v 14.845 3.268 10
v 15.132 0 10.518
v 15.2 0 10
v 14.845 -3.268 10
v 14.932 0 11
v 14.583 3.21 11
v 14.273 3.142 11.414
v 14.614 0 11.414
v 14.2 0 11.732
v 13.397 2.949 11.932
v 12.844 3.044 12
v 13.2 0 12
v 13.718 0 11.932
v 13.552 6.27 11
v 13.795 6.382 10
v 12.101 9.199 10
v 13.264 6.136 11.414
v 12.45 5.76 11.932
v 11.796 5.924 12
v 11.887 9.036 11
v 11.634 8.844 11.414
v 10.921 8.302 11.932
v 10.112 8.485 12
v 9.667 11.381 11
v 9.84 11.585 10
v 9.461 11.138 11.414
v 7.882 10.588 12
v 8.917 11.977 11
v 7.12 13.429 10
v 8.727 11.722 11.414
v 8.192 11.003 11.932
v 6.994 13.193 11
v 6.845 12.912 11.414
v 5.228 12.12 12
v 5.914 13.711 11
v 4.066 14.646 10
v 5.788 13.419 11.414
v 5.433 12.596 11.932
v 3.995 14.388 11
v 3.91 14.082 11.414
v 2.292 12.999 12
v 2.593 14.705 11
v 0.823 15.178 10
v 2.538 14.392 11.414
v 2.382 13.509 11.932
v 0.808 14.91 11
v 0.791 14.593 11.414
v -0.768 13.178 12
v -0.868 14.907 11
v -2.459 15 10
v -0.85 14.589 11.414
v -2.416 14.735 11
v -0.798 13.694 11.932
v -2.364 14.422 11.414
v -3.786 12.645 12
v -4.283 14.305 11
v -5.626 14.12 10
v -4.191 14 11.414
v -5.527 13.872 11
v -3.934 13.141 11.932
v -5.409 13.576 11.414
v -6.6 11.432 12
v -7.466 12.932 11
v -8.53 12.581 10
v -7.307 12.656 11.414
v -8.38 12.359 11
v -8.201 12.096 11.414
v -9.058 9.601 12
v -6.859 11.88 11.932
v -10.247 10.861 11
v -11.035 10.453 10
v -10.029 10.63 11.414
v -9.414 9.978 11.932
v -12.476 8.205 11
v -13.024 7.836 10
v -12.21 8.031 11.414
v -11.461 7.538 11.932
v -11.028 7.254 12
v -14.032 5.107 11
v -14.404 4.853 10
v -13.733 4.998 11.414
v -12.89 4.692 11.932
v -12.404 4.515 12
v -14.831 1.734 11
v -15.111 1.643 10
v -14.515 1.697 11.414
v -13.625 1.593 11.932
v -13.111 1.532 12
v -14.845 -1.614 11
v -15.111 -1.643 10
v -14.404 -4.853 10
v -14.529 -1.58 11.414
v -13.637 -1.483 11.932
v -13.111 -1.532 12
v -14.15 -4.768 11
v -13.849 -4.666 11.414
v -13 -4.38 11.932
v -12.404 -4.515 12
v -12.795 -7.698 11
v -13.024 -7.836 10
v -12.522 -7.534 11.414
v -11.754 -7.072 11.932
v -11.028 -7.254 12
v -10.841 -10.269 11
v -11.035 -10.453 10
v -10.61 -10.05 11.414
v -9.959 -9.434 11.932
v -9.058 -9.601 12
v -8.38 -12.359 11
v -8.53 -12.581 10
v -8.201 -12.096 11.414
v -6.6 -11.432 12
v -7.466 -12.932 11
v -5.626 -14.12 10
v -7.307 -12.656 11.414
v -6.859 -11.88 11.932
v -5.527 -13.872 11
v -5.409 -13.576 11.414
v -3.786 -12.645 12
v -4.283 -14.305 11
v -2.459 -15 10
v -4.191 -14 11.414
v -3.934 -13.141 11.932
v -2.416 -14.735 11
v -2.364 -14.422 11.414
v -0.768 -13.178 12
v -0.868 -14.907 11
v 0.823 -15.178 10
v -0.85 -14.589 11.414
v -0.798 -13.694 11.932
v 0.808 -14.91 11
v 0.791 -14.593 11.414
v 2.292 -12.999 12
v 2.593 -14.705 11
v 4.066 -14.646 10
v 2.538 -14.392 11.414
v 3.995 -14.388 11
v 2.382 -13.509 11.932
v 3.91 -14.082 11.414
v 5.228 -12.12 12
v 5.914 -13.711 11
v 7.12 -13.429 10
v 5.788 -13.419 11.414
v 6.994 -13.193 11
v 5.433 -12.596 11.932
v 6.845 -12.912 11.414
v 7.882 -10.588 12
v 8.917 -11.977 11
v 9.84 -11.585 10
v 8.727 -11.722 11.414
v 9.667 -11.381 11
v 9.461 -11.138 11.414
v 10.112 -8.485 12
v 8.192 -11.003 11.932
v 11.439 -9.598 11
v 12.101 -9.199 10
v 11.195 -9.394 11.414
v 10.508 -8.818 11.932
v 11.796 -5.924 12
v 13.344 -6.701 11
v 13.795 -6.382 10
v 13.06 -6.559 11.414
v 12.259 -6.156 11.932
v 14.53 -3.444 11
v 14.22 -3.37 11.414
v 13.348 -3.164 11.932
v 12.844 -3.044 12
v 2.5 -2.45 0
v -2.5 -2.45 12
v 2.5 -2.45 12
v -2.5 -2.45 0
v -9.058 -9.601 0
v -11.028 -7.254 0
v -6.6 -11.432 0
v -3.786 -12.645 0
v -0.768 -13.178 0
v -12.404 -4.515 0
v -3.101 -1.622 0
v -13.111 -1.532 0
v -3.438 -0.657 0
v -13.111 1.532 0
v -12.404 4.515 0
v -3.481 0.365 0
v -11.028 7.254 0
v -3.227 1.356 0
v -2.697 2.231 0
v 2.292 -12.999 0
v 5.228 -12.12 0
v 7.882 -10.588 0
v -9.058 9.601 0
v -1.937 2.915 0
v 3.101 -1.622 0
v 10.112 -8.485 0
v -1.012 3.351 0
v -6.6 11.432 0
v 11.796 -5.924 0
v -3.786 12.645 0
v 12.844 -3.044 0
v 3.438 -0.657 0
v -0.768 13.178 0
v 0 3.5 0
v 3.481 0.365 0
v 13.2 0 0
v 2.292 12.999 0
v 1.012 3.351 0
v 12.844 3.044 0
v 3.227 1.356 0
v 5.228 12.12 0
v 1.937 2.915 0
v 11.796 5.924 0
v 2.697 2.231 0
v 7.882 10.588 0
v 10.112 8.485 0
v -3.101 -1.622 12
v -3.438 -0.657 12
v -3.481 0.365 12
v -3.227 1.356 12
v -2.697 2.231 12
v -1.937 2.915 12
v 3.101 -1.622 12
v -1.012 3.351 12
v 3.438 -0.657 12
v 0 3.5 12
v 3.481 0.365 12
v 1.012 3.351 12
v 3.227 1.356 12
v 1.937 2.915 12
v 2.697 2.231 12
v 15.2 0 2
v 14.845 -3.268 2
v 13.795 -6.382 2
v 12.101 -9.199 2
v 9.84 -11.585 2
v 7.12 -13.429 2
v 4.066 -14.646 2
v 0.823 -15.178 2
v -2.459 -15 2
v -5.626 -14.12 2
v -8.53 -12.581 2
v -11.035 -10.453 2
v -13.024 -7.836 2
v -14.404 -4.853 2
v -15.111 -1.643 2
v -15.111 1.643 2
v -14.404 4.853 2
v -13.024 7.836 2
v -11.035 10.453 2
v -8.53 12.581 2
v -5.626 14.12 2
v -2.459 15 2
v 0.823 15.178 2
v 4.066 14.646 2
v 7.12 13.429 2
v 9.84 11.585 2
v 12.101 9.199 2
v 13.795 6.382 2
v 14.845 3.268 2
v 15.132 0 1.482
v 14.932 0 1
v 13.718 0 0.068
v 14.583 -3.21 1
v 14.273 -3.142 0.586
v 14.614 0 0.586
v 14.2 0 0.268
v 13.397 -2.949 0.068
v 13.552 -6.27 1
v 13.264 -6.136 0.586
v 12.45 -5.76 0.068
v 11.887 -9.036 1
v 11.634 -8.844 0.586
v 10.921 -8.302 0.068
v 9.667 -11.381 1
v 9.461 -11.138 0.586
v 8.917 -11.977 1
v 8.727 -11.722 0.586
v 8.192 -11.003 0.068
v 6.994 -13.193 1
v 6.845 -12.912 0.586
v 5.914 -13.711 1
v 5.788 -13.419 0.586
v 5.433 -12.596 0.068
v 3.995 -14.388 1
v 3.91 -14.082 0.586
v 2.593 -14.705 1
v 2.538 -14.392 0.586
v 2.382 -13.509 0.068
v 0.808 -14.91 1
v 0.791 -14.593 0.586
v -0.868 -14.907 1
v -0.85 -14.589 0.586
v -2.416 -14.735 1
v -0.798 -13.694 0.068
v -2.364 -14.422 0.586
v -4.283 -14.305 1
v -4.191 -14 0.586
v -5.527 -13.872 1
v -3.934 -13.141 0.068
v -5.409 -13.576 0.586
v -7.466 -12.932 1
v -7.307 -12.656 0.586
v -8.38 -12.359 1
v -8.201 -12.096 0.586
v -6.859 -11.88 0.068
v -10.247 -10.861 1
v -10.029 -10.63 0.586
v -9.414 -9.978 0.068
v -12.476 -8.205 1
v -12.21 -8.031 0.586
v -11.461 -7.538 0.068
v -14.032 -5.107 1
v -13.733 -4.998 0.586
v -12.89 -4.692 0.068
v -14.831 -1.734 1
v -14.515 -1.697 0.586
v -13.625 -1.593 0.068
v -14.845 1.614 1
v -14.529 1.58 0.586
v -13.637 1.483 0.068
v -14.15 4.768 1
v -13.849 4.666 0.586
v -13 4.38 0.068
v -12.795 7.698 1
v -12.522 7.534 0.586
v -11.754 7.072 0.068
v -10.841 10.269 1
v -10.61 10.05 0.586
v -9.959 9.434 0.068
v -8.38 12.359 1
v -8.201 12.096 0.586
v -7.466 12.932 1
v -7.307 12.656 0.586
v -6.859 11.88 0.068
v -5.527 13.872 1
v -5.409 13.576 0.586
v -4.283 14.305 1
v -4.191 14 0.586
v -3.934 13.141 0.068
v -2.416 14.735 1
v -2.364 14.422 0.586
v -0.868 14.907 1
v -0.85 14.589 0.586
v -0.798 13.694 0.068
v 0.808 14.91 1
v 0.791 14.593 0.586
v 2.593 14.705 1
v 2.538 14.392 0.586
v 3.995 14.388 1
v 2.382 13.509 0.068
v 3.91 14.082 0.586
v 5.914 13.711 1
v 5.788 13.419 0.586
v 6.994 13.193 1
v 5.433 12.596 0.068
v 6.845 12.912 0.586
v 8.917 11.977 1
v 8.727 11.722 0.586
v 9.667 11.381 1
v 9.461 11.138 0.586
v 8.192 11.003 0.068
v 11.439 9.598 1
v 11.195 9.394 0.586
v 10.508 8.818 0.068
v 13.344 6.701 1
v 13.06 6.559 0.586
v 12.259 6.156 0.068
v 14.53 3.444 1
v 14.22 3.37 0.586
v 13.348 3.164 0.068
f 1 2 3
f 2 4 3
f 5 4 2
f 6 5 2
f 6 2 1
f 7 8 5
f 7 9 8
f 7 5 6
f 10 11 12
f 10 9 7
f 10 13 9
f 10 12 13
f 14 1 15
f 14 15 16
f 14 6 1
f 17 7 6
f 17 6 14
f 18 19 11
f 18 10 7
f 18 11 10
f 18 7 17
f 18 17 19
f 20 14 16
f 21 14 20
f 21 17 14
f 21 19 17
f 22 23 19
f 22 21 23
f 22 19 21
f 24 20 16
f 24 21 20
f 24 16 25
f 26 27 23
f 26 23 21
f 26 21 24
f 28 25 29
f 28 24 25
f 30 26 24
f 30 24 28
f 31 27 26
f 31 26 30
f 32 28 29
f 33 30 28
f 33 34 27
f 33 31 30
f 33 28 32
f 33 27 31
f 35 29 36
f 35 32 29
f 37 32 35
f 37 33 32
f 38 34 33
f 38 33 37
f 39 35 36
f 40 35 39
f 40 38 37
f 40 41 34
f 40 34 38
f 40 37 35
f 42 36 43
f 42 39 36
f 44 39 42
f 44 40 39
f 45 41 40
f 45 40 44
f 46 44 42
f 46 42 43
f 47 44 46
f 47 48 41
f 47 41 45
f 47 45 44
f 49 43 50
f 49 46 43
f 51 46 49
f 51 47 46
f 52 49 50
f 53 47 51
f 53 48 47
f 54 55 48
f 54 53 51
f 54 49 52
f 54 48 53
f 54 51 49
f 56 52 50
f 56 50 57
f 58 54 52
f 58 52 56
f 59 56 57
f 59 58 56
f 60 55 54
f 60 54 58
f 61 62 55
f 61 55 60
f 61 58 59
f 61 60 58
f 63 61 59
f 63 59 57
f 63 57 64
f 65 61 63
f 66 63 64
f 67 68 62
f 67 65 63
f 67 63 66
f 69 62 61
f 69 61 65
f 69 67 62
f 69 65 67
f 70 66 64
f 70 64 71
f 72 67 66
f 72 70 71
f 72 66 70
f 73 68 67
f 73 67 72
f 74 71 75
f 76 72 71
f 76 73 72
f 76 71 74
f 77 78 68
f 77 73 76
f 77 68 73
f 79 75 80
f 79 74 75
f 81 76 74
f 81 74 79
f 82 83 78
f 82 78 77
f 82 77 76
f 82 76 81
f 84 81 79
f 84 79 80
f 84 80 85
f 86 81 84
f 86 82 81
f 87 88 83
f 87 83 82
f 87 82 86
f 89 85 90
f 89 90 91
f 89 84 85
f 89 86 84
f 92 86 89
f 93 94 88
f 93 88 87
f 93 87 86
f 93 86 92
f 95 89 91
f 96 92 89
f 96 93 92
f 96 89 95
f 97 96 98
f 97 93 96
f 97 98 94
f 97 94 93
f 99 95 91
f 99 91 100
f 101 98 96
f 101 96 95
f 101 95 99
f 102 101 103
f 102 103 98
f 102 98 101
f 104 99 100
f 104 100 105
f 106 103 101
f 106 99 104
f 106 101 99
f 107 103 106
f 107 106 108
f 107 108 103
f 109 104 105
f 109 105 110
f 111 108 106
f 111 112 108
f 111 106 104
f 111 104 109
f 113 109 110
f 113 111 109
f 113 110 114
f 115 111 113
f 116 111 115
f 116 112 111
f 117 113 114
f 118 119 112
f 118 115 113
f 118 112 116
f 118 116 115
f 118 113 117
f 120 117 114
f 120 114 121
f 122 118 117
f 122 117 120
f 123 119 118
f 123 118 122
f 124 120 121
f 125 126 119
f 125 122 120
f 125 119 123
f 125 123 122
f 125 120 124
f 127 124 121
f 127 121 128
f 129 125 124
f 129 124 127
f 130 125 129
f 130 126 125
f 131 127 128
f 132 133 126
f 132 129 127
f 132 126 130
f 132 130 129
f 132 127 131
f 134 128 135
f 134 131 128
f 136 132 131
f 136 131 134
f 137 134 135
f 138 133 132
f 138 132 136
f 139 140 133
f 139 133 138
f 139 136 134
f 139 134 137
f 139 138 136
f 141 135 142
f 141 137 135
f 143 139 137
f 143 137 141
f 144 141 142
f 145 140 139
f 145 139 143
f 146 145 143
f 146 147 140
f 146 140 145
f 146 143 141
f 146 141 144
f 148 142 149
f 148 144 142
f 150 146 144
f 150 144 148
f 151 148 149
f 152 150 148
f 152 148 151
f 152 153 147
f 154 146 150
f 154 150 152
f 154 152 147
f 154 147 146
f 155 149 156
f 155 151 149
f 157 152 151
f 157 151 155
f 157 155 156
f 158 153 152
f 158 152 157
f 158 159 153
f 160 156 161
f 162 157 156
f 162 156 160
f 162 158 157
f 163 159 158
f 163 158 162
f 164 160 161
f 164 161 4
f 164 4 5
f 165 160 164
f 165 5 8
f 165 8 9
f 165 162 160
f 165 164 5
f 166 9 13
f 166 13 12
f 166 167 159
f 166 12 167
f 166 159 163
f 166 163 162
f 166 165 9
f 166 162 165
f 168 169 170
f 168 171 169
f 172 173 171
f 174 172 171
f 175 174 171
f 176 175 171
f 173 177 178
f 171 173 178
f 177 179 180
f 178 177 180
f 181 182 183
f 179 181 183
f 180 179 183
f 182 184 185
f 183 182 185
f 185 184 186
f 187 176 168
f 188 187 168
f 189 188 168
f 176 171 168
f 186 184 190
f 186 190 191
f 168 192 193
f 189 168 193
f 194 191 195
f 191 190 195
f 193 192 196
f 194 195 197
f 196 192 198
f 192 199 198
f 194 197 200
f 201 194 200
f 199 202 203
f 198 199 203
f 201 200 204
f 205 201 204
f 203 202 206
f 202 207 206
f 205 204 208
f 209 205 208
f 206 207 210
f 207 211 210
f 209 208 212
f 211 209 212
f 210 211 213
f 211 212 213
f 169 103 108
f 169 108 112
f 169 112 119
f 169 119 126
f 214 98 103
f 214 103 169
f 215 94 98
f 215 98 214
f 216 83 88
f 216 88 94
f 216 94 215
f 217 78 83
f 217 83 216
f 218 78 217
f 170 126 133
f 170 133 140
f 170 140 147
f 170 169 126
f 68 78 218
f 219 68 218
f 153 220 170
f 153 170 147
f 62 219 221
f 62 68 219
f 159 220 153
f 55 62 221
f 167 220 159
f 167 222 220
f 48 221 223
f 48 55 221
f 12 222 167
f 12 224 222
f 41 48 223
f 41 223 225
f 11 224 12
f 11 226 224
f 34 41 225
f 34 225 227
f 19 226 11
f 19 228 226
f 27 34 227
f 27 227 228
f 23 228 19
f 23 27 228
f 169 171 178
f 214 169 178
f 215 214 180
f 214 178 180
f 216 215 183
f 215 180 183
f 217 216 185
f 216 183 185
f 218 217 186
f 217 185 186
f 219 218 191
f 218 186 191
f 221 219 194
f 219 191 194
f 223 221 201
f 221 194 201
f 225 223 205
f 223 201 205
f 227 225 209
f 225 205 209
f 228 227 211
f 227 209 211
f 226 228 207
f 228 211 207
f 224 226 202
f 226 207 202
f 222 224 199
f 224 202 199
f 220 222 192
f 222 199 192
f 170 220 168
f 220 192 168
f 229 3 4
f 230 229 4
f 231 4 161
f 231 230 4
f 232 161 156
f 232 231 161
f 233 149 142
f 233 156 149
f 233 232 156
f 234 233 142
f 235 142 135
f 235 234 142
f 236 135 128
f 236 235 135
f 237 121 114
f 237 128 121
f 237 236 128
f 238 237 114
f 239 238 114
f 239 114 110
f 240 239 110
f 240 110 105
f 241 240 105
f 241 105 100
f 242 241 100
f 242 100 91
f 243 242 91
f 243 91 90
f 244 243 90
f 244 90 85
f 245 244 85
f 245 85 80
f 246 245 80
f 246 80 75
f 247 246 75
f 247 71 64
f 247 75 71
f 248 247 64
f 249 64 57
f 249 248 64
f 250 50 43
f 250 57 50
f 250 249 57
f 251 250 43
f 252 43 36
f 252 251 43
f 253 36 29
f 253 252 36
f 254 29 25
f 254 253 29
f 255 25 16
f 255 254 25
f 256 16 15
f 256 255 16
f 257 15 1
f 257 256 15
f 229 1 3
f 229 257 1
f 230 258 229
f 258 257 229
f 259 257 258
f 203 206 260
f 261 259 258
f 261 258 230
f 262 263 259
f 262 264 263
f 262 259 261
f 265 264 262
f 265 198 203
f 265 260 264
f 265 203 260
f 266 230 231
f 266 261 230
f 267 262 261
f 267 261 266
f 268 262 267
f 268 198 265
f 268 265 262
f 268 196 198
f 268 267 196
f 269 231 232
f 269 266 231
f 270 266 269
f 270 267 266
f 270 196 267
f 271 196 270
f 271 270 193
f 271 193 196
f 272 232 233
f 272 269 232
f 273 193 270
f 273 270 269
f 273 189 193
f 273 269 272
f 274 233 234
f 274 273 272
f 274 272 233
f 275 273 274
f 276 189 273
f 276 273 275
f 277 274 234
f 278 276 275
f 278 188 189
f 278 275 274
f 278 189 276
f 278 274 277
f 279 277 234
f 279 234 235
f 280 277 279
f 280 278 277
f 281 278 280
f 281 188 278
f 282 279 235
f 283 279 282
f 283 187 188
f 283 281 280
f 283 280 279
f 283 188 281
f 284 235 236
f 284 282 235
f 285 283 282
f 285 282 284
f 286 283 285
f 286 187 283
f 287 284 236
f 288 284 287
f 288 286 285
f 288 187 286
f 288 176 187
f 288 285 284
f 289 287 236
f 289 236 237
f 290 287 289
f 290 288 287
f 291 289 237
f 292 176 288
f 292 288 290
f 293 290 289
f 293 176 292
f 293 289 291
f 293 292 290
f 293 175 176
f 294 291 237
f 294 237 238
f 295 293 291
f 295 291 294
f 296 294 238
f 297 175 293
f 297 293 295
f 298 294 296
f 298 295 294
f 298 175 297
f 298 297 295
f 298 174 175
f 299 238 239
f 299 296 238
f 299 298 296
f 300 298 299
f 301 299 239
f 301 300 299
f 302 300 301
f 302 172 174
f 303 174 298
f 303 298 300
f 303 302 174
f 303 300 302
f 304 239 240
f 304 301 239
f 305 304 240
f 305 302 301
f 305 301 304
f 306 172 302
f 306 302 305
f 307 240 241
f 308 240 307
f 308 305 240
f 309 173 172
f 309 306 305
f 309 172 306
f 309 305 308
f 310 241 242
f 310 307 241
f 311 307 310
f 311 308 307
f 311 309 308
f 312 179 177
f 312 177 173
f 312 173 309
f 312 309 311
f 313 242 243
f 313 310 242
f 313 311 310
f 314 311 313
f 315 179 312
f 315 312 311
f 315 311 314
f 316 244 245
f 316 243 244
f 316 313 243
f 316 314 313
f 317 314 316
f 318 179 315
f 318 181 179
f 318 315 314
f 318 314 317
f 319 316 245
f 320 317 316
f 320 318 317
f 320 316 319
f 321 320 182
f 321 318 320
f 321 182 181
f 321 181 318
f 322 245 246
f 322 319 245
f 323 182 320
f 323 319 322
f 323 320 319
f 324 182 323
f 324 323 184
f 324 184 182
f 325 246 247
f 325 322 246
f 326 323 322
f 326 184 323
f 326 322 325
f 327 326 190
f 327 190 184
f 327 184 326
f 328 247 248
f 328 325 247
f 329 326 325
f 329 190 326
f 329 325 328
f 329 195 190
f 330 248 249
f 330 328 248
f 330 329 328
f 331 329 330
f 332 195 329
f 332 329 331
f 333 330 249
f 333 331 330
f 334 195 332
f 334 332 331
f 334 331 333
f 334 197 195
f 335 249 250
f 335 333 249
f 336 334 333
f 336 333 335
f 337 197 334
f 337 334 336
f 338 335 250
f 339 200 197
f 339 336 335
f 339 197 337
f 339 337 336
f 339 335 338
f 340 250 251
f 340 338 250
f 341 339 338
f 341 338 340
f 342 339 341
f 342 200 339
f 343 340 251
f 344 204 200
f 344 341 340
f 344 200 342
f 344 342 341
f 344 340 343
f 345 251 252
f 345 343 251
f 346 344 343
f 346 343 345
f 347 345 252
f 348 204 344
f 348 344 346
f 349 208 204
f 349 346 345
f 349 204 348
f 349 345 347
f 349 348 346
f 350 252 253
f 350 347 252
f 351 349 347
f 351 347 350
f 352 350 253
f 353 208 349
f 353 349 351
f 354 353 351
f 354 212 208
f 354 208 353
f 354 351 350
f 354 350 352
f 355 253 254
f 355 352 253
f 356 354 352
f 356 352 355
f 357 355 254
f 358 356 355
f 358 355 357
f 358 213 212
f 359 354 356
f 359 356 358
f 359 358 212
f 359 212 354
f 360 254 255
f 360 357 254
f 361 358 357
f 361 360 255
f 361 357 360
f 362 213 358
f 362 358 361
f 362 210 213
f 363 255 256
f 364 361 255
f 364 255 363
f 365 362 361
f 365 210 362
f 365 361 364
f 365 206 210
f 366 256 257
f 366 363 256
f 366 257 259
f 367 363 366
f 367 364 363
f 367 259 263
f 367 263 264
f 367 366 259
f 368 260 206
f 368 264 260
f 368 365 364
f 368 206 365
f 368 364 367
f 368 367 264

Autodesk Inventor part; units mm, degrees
ref_plane "YZ Plane" through (0, 0, 0) normal (1, 0, 0) x (0, 1, 0)
ref_plane "XZ Plane" through (0, 0, 0) normal (0, 1, 0) x (-1, 0, 0)
ref_plane "XY Plane" through (0, 0, 0) normal (0, 0, 1) x (1, 0, 0)
sketch "Sketch1" plane through (0, 0, 0) normal (0, 0, 1) x (1, 0, 0)
  circle A0 centre (0, 0) radius 15.2
  circle A1 centre (0, 0) radius 3.5
  line L0 (-2.5, -2.4495) -> (2.5, -2.4495)
  dimension "d0" = 30.4
  dimension "d1" = 7
  dimension "d2" = 5
extrude "Extrusion1" add sketch "Sketch1" along normal blind 12 contours A0 | L0 A1 picked at (0.6279, -2.6163)
fillet "Fillet1" radius 2 2 edges at (-15.2, 0, 12) (-15.2, 0, 0)
